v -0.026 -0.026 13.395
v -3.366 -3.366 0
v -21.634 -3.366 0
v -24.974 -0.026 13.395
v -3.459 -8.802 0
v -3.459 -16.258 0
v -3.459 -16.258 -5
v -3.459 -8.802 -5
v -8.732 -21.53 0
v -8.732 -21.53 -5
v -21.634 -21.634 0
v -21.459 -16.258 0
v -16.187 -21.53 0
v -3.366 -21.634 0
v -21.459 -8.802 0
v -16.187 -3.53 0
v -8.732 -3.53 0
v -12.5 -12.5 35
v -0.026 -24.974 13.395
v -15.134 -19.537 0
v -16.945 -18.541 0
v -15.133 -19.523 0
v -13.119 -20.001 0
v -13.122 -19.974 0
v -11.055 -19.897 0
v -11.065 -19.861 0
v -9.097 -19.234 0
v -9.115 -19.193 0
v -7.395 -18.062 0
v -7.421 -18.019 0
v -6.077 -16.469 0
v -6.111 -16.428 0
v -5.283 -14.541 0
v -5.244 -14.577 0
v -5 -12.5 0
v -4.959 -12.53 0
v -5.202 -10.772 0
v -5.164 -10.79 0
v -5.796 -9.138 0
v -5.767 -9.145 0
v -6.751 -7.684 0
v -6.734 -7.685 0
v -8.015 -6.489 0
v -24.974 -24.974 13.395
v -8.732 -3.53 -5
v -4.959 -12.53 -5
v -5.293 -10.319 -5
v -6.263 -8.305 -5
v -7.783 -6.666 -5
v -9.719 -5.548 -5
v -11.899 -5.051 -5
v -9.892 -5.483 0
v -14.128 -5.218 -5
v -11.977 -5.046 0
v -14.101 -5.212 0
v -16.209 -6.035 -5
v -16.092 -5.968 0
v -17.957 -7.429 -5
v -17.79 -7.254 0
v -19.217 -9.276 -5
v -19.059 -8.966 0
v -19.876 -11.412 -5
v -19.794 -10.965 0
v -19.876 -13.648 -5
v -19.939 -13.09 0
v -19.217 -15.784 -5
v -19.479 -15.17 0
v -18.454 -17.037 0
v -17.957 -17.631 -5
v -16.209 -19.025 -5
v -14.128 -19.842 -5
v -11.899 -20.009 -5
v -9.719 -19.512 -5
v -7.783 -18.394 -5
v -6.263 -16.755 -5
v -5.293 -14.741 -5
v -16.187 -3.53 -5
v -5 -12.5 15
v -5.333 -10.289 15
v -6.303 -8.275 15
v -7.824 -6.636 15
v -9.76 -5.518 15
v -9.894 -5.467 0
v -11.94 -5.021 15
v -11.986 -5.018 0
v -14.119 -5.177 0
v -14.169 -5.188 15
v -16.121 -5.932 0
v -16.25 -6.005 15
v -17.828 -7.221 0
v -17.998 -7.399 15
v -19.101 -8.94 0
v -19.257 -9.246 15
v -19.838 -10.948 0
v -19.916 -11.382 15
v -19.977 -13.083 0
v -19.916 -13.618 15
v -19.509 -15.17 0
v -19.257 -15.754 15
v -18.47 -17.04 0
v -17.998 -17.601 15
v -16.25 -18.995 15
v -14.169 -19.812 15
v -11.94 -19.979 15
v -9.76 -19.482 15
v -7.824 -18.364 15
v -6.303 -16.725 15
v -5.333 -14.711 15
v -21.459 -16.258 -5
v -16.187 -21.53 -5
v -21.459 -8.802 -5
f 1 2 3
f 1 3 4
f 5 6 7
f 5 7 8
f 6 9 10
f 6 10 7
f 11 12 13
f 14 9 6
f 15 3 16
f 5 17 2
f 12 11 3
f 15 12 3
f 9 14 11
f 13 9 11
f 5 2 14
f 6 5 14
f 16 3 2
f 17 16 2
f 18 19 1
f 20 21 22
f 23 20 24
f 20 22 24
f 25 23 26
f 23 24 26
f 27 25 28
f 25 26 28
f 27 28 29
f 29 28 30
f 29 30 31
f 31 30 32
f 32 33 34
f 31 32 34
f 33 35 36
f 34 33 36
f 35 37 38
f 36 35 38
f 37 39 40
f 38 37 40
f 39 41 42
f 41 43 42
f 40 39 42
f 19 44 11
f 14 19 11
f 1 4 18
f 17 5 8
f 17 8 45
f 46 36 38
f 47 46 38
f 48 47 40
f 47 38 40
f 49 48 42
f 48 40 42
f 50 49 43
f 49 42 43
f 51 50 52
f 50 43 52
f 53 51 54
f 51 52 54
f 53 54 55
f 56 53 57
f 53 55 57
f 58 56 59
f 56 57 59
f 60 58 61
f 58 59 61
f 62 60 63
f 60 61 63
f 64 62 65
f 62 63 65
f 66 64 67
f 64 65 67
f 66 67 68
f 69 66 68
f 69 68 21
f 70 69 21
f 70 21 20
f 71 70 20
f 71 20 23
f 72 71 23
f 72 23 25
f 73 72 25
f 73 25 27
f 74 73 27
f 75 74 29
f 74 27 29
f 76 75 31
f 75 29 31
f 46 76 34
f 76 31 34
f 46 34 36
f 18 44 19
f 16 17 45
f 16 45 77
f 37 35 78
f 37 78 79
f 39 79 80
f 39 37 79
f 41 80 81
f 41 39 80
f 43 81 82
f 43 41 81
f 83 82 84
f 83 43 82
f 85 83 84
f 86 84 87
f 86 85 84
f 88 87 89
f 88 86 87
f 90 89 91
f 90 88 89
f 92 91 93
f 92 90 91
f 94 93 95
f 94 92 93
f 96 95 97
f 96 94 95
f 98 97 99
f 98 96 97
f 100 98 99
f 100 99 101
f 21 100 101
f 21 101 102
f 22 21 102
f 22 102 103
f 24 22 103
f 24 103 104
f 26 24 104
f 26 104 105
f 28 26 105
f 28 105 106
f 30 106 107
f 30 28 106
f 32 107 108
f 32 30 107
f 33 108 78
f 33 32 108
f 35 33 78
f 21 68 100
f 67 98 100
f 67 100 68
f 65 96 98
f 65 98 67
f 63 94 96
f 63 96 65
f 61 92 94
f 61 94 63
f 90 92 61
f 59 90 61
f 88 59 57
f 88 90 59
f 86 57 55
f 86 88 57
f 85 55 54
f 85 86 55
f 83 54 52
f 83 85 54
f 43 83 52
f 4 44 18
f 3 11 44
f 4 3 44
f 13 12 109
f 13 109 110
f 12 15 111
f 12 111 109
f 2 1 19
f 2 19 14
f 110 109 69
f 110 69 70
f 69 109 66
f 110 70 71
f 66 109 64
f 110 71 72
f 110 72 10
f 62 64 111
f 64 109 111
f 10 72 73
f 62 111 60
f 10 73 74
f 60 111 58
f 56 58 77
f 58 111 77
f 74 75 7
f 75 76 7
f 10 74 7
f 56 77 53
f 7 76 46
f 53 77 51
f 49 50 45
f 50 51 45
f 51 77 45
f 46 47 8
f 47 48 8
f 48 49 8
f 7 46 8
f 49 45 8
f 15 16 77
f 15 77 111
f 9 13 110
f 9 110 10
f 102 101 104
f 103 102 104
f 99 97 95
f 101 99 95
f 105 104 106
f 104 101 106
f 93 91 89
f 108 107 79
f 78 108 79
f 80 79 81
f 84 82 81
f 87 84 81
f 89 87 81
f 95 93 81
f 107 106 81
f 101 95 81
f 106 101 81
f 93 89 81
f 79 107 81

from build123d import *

# Parameters (mm, degrees)
F0_W        = 25
F0_H        = 25
F0_R        = 7.5
F1_DEPTH    = 35
F2_DEPTH    = 15
F3_SIZE2    = 21.650625
F3_SIZE     = 12.49999
F4_R        = 7.5
F5_DEPTH    = 5
F6_T1_DEPTH = 95.1228407313
F6_T3_DEPTH = 95.1228407313


# Not quite as in the source:
# - a fillet or chamfer that OpenCascade refuses, or shapes differently, is made with other operations: its cross-section is extruded or revolved along the edge and cut away or added
# - a fillet or chamfer is up to 0.001 mm smaller than in the source, because OpenCascade refuses the exact size


with BuildPart() as f1:
    # F0 (on Top) → F1 (new body)
    with BuildSketch(Plane.XY):
        with Locations((-12.5, -12.5)):
            Rectangle(F0_W, F0_H)
        with Locations((-12.5, -12.5)):
            Circle(F0_R, mode=Mode.SUBTRACT)
        with Locations((-12.5, -12.5)):
            Circle(F0_R)
    extrude(amount=F1_DEPTH)

    # F0 (on Top) → F2 (cut)
    with BuildSketch(Plane.XY):
        with Locations((-12.5, -12.5)):
            Circle(F0_R)
    extrude(amount=F2_DEPTH, mode=Mode.SUBTRACT)

    # F3 (size 12.5 and 21.6506350946 in the source; OpenCascade refuses exactly that, so slightly less here)
    f3_edges = [f1.edges().sort_by_distance(p)[0] for p in [
        (-25, -12.5, 35),
        (-12.5, -25, 35),
        (0, -12.5, 35),
        (-12.5, 0, 35),
    ]]
    f3_side = f1.faces().sort_by_distance((-12.5, -12.5, 35))[0]
    chamfer(f3_edges, length=F3_SIZE, length2=F3_SIZE2, reference=f3_side)

    # F4 (on Top) → F5 (join)
    with BuildSketch(Plane.XY):
        Polygon((-3.4594764784, -16.2579490188), (-3.4594764784, -8.802104896), (-8.731554417, -3.5300269574), (-16.1873985398, -3.5300269574), (-21.4594764784, -8.802104896), (-21.4594764784, -16.2579490188), (-16.1873985398, -21.5300269574), (-8.731554417, -21.5300269574), align=None)
        with Locations((-12.4594764784, -12.5300269574)):
            Circle(F4_R, mode=Mode.SUBTRACT)
    extrude(amount=-F5_DEPTH)

    # F6: chamfer of 13.5 x 3.3659280384 on 4 edges, made by hand

    # F6_s2 → F6_t1 (cut)
    with BuildSketch(Plane.YZ.offset(-60.0614203657)):
        Polygon((-25, 13.5), (-21.6340719616, 0), (-25, 0), align=None)
        Polygon((-3.3659280384, 0), (0, 13.5), (0, 0), align=None)
    extrude(amount=F6_T1_DEPTH, mode=Mode.SUBTRACT)

    # F6_s4 → F6_t3 (cut)
    with BuildSketch(Plane.XZ.offset(-35.0614203657)):
        Polygon((0, 13.5), (-3.3659280384, 0), (0, 0), align=None)
        Polygon((-21.6340719616, 0), (-25, 13.5), (-25, 0), align=None)
    extrude(amount=F6_T3_DEPTH, mode=Mode.SUBTRACT)


solid = f1.part
